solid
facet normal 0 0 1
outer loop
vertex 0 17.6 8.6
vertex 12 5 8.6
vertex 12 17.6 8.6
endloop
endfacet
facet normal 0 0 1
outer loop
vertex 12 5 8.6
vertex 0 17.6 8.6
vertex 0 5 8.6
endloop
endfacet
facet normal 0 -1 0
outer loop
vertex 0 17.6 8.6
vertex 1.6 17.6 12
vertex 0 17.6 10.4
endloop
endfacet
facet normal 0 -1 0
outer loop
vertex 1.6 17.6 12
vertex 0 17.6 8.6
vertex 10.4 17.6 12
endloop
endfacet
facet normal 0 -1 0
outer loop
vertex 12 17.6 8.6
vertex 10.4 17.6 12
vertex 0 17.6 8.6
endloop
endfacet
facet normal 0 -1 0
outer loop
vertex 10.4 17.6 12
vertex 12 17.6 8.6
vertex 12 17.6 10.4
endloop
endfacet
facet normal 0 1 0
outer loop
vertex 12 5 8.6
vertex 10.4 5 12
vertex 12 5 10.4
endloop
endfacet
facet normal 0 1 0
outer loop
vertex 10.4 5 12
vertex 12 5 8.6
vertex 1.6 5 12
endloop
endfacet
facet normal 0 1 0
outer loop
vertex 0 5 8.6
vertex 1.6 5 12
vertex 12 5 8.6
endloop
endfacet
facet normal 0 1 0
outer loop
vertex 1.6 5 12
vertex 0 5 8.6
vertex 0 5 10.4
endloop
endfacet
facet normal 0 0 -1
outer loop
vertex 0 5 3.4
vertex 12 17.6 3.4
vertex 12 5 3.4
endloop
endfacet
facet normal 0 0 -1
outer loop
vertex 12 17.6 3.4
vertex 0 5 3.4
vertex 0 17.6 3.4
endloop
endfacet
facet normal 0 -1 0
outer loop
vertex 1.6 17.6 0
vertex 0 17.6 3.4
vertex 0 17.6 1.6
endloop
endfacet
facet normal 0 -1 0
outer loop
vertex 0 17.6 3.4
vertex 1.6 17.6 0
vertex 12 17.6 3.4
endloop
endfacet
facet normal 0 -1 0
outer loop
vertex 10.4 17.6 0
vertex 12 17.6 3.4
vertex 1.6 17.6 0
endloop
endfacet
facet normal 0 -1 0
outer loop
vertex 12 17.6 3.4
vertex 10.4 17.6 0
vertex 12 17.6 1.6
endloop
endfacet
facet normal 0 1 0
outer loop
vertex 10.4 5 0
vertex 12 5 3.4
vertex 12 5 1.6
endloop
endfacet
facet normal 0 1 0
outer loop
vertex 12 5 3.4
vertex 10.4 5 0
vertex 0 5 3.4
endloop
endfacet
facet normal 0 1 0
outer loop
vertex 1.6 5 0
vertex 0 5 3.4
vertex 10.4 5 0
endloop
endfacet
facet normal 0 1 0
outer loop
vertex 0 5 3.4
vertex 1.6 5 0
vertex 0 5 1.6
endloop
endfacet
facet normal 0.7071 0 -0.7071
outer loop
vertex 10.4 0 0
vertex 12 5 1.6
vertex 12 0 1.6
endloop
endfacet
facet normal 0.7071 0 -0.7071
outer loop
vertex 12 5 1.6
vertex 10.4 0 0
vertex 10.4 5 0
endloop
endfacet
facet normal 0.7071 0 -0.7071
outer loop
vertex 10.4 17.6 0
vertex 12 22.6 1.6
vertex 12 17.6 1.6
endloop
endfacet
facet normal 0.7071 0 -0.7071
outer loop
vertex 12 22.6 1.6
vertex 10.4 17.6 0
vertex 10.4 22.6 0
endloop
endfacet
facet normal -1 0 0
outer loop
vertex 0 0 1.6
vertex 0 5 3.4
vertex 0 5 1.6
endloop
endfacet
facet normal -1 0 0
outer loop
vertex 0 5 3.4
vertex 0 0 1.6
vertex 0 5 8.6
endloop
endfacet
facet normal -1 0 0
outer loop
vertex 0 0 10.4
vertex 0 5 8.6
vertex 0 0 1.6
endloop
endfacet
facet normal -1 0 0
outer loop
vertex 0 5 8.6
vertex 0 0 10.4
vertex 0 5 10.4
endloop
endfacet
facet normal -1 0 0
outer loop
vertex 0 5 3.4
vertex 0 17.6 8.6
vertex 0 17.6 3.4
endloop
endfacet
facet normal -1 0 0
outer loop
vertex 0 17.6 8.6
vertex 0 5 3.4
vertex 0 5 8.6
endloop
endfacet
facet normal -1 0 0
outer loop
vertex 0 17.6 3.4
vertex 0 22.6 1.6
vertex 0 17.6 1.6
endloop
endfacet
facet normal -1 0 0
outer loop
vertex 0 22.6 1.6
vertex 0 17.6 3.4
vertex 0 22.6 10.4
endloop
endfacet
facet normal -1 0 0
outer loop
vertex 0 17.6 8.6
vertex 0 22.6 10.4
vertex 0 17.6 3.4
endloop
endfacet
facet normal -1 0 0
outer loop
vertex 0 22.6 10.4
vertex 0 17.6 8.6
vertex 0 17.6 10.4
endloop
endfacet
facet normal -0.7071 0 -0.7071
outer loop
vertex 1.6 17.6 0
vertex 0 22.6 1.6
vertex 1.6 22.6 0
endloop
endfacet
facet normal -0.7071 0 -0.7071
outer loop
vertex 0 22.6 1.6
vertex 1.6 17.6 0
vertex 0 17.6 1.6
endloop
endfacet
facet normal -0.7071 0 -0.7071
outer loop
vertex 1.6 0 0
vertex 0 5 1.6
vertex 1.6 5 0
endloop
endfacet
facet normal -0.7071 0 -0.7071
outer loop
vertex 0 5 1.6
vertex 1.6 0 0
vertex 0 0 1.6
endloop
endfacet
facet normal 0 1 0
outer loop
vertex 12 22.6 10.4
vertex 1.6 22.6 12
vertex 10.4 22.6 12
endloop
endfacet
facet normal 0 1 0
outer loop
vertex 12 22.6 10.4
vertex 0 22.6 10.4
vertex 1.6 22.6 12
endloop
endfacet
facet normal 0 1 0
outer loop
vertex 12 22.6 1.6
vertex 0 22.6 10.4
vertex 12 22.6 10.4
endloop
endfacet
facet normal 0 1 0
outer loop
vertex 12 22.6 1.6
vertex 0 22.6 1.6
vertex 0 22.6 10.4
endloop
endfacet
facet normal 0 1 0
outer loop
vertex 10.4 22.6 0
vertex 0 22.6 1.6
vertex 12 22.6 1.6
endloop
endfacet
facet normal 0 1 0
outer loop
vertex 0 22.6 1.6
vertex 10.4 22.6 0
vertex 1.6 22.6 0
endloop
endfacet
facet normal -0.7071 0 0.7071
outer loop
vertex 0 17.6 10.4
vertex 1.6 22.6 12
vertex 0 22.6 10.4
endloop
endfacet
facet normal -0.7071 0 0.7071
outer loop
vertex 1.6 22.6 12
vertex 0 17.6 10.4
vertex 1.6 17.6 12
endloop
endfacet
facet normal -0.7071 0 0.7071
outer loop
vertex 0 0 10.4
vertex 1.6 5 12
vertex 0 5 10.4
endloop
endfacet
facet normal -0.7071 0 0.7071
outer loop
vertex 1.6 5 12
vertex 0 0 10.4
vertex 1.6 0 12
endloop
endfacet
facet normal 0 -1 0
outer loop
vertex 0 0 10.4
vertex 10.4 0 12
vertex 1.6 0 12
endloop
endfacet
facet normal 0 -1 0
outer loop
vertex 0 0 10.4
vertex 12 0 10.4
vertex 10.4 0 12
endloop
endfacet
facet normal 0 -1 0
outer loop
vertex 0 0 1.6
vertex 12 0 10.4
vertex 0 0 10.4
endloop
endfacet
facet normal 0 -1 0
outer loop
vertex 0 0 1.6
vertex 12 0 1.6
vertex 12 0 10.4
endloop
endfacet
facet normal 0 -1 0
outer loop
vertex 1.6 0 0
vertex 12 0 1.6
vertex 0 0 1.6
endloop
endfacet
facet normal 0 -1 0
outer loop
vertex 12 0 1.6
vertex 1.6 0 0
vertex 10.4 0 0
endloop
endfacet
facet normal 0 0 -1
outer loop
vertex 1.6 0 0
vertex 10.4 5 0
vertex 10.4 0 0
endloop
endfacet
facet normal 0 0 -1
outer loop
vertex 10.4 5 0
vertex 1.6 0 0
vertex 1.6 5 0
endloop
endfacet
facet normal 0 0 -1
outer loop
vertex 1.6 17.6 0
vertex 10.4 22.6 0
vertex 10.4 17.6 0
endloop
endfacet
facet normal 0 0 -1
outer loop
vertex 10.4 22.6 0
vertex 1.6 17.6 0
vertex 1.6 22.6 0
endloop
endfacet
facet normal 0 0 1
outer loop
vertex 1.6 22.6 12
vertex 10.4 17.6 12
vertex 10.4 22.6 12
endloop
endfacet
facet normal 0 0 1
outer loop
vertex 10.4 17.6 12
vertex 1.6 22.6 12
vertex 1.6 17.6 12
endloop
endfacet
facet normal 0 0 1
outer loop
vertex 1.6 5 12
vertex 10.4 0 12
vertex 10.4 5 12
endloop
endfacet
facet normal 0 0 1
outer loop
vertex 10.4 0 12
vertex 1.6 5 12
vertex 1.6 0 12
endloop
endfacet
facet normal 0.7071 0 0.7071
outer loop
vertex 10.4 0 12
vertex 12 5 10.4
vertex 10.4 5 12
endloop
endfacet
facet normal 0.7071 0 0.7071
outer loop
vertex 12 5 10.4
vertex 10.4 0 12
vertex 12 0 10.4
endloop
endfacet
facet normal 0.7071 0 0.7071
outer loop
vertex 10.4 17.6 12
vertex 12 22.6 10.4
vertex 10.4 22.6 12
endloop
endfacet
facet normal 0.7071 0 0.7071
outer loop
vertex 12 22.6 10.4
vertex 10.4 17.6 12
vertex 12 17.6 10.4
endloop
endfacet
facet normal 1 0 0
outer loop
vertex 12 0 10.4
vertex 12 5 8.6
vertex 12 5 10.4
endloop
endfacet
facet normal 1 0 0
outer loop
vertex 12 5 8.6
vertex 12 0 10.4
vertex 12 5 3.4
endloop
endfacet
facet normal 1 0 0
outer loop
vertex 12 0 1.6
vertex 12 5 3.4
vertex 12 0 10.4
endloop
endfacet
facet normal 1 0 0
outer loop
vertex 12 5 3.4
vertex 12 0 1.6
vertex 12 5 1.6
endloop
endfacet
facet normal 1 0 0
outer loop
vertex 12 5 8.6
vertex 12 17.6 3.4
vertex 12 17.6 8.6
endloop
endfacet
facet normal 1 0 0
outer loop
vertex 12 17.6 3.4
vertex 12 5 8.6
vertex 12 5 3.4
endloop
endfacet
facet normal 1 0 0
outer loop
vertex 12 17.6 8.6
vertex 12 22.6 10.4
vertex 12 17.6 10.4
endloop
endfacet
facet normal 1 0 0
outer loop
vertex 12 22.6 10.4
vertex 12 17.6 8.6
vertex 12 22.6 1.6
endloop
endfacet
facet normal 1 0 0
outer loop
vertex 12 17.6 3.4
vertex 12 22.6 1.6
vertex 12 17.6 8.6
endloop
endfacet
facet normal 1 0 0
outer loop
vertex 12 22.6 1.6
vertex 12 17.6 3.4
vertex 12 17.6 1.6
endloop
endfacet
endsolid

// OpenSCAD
/* [Main] */
// Length of piece with two slots (default is 80)
length = 80; // [60:200]

// Width of the log (default is 12)
width = 12; // [8:30]

// Main component type
type = "log"; //[log:Log, post:Post (experimental only works with flat timber)]

// Style of the base timber
log_style = "flat"; // [flat:Flat, rounded:Rounded, hex:Hexagon (experimental)]

// Style of the timber notch/slot
notch_style = "basic"; // [basic:Basic, dala:Dalaknut (experimental), none:No notches]

// Number of slots
slots = 1;

// Chop off one of the ends of the log
chopped = "no"; // [no:No,yes:Yes]

// Peg holes in the slots
slot_holes = "no"; // [no:No,yes:Yes]

// Number of extra slots on top side
extra_slots_top = 0; // [0:2]

// Number of extra slots on bottom side
extra_slots_bottom = 0; // [0:2]

// Special functions
special = ""; // [:Nothing, brio: Brio wood track slot, lego: Top side lego studs (not supported yet) ]


/* [Post] */

// Post height (in number of logs)
post_height = 7; // [2:20]

/* [Hidden] */
_n = slots; 
_w = width;
_chamfer = 1.6;
_l_knot = 5;
_slot_depth_tolerance = 0.4;
_slot_width_tolerance = 0.6;
_slot_depth = _w/4+_slot_depth_tolerance;
_slot_l = _w+_slot_width_tolerance; // Slot length
_slot_spacing = length - 2* _l_knot - 2*_slot_l;

_chop_length_tolerance = 0.5;

_min_length = 2*_l_knot + _slot_l; // Length of piece with one slot
_extending_length = length - _min_length;

_l = _min_length + (_n-1)*_extending_length; // Total length

_slot_distance = length-2*_l_knot-_slot_l;

_chopped = chopped;
_slot_holes = slot_holes;
_special = special;

_hex_width = _w*0.2;

print();

module print() {
    //translate([0,0,0]) half_timber();
    //translate([_w*2,0,0]) half_timber();
    //translate([-_w/2,0,0]) rotate([0,-90,0])
    if (type == "post") {
        full_timber(top_slots=false);

        translate([0,0,(_w/2)*(post_height-1)])
        translate([_w/2,_l_knot+_slot_l/2,0])
        rotate([0,0,90*(post_height-1)]) 
        translate([-_w/2,-_l_knot-_slot_l/2,0]) 
            full_timber(bottom_slots=false);
        
        translate([0,_w+_l_knot+(_slot_l-_w)/2,_slot_depth])
        rotate([90,0,0])
            timber((_w/2)*(post_height) - _slot_depth_tolerance*2);
        
    } else {
        if (log_style == "flat") {
            //rotate([0,-90,0]) 
                full_timber();
        } else {
            full_timber();
        }
    }
    //translate([-_w*2,0,0]) rotate([0,-90,0]) full_timber();    
}

module half_timber() {
    translate([0,0,-_w/2])
    difference() {
        full_timber();
        translate([-1,-1,-2]) cube([_w+2,_l+2,_w/2+2]);
    }
}

module post() {
    
}

module full_timber(top_slots=true,bottom_slots=true) {
    difference() {
        timber(_l);
        
        slots() slot(top_slots=top_slots,bottom_slots=bottom_slots);
        /*
        for (i = [1:_n]) {
            translate([0,_l_knot + (i-1)*_slot_distance,0]) {
                slot();
                if (_slot_holes == "yes") {
                    translate([_w/2,_slot_l/2,0]) cylinder(r=2.5,h=_w,$fn=20);
                }
            }
        }
        */
        if (log_style == "rounded") {
            slots() cutouts();
        }
        
        if (_slot_holes == "yes") {
            slots() translate([_w/2,_slot_l/2,0]) cylinder(r=2.5,h=_w,$fn=20);
        }
        
        if (_chopped == "yes") {
            translate([-_w*0.5,(_n-1)*_extending_length-_chop_length_tolerance,-1]) cube([_w*2,_min_length+2,_w+2]);
        }
        
        if (_special == "brio") {
            _brio_slot_width = 40;
            if (_n > 1) {
                for (i = [1:_n-1]) {
                    translate([-_w/2, length/2 - _brio_slot_width/2 + (i-1)*(_extending_length),_w/2]) cube([_w*2,_brio_slot_width,_w+2]);
                }
            }
        }
        
        extra_slots(extra_slots_top) slot_top();
        extra_slots(extra_slots_bottom) slot_bottom();
        
        if (log_style == "rounded") {
            extra_slots(extra_slots_top) cutout_top();
            extra_slots(extra_slots_bottom) cutout_bottom();
        }
        
    }
}

module slots() {
     for (i = [1:_n]) {
        translate([0,_l_knot + (i-1)*_slot_distance,0]) {
            children();
        }
    }
}

module extra_slots(extra_slots) {
     if (extra_slots > 0) {
            _extra_slot_spacing = (_slot_spacing - _slot_l*extra_slots) / (extra_slots+1);
            for (i = [0:_n-2]) {
                //slot_top();
                translate([0,_l_knot + _slot_l  + _extra_slot_spacing + i*_extending_length ,0])
                    for (i = [0:extra_slots-1]) {
                        translate([0,i*(_slot_l + _extra_slot_spacing),0]) children();
                    }
            }
        }
}



module slot(top_slots=true,bottom_slots=true) {
    //translate([-1,0,-2]) cube([_w+2,_slot_l,_w/4+_slot_depth_tolerance+2]);
    if (top_slots) {
        slot_top();
    }
    if (bottom_slots) {
        slot_bottom();
    }
    
}

module slot_top() {
    if (notch_style == "basic") {
        translate([-_w/2-1,0,_w/4*3-_slot_depth_tolerance]) cube([2*_w+2,_slot_l,_w/4+2]);
    } else if (notch_style == "dala") {
        slot_top_dala();

    }
}

module slot_top_dala() {
    if (log_style == "hex") {
        difference() {
            translate([_min_length-1,0,_w/2]) rotate([0,0,90]) hex_timber(_min_length,width_tolerance=0.2);
            translate([_w/2-_w/4,0,_w/2]) cube([_w/2,_w,_w/4]);
        }
        //translate([-_w+_w/4,0,_w/2]) cube([_w,_slot_l,_w]);
        //translate([-_w/2 -1,0,_w*(3/4)]) cube([_w*2+2,_slot_l,_w]);
        //translate([_w-_w/4,0,_w/2-_slot_depth_tolerance]) cube([_w,_slot_l,_w]);
    } else {
        translate([-_w+_w/4,0,_w/2-_slot_depth_tolerance]) cube([_w,_slot_l,_w]);
        translate([-_w/2 -1,0,_w*(3/4)]) cube([_w*2+2,_slot_l,_w]);
        translate([_w-_w/4,0,_w/2-_slot_depth_tolerance]) cube([_w,_slot_l,_w]);
    }
}

module slot_bottom() {
    if (notch_style == "basic") {
        translate([-_w/2-1,0,-2]) cube([2*_w+2,_slot_l,_w/4+_slot_depth_tolerance+2]);
    } else if (notch_style == "dala") {
        slot_bottom_dala();
    }
}

module slot_bottom_dala() {
    if (log_style == "hex") {
        translate([-_w/2,_w/2-_w/4-_slot_width_tolerance/2,-_w/4+_slot_depth_tolerance]) cube([_w*2,_w/2+_slot_width_tolerance,_w/2]);
    } else {
        translate([-_w/2,_w/2-_w/4-_slot_width_tolerance/2,-_w/4+_slot_depth_tolerance]) cube([_w*2,_w/2+_slot_width_tolerance,_w/2]);
    }
}

module cutouts() {
    cutout_top();
    cutout_bottom();
}

module cutout_top() {
    translate([_w,0,_w/2-_slot_depth_tolerance]) slot_cut();
    translate([0,0,_w/2-_slot_depth_tolerance]) mirror([1,0,0]) slot_cut();
}

module cutout_bottom() {
    translate([_w,0,-_w/2+_slot_depth_tolerance]) slot_cut();
    translate([0,0,-_w/2+_slot_depth_tolerance]) mirror([1,0,0]) slot_cut();
}

module slot_cut() {
    translate([0,0,0]) cube([_w,_slot_l,_w]);
    rotate([0,0,-45]) cube([_w,_slot_l,_w]);
    translate([0,_slot_l,0]) rotate([0,0,-45]) cube([_w,_slot_l,_w]);
}

//timber(_l);
module timber(length) {
    if (log_style == "rounded") {
        rounded_timber(length);
    } else if (log_style == "hex") {
        hex_timber(length);
    } else {
        square_timber(length);
    }
}

module rounded_timber(length) {

    translate([_w/2,0,_w/2])
    rotate([0,90,0])
    rotate([-90,0,0])
    difference() {
        cylinder(r=sqrt(2*pow(_w,2))/2,h=length);
        translate([_w/2,-_w/2,-1]) cube([_w,_w,length+2]);
        translate([-_w/2-_w,-_w/2,-1]) cube([_w,_w,length+2]);
    }
    
}


module square_timber(length) {
    translate([0,length,0])
    rotate([90,0,0])
    linear_extrude(height=length) {
    polygon([
        [_chamfer,0],
        [0,_chamfer],
        [0,_w-_chamfer],
        [_chamfer,_w],
        [_w-_chamfer,_w],
        [_w,_w-_chamfer],
        [_w,_chamfer],
        [_w-_chamfer,0]
    ]);
    }
    
    //cube([_w,length,_w]);
}

module hex_timber(length,width_tolerance=0) {
    translate([0,length,0])
    rotate([90,0,0])
    linear_extrude(height=length) {
    polygon([
        [_hex_width-width_tolerance,0],
        [-width_tolerance,_w/2],
        [_hex_width-width_tolerance,_w],
        [_w-_hex_width+width_tolerance,_w],
        [_w+width_tolerance,_w/2],
        [_w-_hex_width+width_tolerance,0]
    ]);
    }
    
    //cube([_w,length,_w]);
}
